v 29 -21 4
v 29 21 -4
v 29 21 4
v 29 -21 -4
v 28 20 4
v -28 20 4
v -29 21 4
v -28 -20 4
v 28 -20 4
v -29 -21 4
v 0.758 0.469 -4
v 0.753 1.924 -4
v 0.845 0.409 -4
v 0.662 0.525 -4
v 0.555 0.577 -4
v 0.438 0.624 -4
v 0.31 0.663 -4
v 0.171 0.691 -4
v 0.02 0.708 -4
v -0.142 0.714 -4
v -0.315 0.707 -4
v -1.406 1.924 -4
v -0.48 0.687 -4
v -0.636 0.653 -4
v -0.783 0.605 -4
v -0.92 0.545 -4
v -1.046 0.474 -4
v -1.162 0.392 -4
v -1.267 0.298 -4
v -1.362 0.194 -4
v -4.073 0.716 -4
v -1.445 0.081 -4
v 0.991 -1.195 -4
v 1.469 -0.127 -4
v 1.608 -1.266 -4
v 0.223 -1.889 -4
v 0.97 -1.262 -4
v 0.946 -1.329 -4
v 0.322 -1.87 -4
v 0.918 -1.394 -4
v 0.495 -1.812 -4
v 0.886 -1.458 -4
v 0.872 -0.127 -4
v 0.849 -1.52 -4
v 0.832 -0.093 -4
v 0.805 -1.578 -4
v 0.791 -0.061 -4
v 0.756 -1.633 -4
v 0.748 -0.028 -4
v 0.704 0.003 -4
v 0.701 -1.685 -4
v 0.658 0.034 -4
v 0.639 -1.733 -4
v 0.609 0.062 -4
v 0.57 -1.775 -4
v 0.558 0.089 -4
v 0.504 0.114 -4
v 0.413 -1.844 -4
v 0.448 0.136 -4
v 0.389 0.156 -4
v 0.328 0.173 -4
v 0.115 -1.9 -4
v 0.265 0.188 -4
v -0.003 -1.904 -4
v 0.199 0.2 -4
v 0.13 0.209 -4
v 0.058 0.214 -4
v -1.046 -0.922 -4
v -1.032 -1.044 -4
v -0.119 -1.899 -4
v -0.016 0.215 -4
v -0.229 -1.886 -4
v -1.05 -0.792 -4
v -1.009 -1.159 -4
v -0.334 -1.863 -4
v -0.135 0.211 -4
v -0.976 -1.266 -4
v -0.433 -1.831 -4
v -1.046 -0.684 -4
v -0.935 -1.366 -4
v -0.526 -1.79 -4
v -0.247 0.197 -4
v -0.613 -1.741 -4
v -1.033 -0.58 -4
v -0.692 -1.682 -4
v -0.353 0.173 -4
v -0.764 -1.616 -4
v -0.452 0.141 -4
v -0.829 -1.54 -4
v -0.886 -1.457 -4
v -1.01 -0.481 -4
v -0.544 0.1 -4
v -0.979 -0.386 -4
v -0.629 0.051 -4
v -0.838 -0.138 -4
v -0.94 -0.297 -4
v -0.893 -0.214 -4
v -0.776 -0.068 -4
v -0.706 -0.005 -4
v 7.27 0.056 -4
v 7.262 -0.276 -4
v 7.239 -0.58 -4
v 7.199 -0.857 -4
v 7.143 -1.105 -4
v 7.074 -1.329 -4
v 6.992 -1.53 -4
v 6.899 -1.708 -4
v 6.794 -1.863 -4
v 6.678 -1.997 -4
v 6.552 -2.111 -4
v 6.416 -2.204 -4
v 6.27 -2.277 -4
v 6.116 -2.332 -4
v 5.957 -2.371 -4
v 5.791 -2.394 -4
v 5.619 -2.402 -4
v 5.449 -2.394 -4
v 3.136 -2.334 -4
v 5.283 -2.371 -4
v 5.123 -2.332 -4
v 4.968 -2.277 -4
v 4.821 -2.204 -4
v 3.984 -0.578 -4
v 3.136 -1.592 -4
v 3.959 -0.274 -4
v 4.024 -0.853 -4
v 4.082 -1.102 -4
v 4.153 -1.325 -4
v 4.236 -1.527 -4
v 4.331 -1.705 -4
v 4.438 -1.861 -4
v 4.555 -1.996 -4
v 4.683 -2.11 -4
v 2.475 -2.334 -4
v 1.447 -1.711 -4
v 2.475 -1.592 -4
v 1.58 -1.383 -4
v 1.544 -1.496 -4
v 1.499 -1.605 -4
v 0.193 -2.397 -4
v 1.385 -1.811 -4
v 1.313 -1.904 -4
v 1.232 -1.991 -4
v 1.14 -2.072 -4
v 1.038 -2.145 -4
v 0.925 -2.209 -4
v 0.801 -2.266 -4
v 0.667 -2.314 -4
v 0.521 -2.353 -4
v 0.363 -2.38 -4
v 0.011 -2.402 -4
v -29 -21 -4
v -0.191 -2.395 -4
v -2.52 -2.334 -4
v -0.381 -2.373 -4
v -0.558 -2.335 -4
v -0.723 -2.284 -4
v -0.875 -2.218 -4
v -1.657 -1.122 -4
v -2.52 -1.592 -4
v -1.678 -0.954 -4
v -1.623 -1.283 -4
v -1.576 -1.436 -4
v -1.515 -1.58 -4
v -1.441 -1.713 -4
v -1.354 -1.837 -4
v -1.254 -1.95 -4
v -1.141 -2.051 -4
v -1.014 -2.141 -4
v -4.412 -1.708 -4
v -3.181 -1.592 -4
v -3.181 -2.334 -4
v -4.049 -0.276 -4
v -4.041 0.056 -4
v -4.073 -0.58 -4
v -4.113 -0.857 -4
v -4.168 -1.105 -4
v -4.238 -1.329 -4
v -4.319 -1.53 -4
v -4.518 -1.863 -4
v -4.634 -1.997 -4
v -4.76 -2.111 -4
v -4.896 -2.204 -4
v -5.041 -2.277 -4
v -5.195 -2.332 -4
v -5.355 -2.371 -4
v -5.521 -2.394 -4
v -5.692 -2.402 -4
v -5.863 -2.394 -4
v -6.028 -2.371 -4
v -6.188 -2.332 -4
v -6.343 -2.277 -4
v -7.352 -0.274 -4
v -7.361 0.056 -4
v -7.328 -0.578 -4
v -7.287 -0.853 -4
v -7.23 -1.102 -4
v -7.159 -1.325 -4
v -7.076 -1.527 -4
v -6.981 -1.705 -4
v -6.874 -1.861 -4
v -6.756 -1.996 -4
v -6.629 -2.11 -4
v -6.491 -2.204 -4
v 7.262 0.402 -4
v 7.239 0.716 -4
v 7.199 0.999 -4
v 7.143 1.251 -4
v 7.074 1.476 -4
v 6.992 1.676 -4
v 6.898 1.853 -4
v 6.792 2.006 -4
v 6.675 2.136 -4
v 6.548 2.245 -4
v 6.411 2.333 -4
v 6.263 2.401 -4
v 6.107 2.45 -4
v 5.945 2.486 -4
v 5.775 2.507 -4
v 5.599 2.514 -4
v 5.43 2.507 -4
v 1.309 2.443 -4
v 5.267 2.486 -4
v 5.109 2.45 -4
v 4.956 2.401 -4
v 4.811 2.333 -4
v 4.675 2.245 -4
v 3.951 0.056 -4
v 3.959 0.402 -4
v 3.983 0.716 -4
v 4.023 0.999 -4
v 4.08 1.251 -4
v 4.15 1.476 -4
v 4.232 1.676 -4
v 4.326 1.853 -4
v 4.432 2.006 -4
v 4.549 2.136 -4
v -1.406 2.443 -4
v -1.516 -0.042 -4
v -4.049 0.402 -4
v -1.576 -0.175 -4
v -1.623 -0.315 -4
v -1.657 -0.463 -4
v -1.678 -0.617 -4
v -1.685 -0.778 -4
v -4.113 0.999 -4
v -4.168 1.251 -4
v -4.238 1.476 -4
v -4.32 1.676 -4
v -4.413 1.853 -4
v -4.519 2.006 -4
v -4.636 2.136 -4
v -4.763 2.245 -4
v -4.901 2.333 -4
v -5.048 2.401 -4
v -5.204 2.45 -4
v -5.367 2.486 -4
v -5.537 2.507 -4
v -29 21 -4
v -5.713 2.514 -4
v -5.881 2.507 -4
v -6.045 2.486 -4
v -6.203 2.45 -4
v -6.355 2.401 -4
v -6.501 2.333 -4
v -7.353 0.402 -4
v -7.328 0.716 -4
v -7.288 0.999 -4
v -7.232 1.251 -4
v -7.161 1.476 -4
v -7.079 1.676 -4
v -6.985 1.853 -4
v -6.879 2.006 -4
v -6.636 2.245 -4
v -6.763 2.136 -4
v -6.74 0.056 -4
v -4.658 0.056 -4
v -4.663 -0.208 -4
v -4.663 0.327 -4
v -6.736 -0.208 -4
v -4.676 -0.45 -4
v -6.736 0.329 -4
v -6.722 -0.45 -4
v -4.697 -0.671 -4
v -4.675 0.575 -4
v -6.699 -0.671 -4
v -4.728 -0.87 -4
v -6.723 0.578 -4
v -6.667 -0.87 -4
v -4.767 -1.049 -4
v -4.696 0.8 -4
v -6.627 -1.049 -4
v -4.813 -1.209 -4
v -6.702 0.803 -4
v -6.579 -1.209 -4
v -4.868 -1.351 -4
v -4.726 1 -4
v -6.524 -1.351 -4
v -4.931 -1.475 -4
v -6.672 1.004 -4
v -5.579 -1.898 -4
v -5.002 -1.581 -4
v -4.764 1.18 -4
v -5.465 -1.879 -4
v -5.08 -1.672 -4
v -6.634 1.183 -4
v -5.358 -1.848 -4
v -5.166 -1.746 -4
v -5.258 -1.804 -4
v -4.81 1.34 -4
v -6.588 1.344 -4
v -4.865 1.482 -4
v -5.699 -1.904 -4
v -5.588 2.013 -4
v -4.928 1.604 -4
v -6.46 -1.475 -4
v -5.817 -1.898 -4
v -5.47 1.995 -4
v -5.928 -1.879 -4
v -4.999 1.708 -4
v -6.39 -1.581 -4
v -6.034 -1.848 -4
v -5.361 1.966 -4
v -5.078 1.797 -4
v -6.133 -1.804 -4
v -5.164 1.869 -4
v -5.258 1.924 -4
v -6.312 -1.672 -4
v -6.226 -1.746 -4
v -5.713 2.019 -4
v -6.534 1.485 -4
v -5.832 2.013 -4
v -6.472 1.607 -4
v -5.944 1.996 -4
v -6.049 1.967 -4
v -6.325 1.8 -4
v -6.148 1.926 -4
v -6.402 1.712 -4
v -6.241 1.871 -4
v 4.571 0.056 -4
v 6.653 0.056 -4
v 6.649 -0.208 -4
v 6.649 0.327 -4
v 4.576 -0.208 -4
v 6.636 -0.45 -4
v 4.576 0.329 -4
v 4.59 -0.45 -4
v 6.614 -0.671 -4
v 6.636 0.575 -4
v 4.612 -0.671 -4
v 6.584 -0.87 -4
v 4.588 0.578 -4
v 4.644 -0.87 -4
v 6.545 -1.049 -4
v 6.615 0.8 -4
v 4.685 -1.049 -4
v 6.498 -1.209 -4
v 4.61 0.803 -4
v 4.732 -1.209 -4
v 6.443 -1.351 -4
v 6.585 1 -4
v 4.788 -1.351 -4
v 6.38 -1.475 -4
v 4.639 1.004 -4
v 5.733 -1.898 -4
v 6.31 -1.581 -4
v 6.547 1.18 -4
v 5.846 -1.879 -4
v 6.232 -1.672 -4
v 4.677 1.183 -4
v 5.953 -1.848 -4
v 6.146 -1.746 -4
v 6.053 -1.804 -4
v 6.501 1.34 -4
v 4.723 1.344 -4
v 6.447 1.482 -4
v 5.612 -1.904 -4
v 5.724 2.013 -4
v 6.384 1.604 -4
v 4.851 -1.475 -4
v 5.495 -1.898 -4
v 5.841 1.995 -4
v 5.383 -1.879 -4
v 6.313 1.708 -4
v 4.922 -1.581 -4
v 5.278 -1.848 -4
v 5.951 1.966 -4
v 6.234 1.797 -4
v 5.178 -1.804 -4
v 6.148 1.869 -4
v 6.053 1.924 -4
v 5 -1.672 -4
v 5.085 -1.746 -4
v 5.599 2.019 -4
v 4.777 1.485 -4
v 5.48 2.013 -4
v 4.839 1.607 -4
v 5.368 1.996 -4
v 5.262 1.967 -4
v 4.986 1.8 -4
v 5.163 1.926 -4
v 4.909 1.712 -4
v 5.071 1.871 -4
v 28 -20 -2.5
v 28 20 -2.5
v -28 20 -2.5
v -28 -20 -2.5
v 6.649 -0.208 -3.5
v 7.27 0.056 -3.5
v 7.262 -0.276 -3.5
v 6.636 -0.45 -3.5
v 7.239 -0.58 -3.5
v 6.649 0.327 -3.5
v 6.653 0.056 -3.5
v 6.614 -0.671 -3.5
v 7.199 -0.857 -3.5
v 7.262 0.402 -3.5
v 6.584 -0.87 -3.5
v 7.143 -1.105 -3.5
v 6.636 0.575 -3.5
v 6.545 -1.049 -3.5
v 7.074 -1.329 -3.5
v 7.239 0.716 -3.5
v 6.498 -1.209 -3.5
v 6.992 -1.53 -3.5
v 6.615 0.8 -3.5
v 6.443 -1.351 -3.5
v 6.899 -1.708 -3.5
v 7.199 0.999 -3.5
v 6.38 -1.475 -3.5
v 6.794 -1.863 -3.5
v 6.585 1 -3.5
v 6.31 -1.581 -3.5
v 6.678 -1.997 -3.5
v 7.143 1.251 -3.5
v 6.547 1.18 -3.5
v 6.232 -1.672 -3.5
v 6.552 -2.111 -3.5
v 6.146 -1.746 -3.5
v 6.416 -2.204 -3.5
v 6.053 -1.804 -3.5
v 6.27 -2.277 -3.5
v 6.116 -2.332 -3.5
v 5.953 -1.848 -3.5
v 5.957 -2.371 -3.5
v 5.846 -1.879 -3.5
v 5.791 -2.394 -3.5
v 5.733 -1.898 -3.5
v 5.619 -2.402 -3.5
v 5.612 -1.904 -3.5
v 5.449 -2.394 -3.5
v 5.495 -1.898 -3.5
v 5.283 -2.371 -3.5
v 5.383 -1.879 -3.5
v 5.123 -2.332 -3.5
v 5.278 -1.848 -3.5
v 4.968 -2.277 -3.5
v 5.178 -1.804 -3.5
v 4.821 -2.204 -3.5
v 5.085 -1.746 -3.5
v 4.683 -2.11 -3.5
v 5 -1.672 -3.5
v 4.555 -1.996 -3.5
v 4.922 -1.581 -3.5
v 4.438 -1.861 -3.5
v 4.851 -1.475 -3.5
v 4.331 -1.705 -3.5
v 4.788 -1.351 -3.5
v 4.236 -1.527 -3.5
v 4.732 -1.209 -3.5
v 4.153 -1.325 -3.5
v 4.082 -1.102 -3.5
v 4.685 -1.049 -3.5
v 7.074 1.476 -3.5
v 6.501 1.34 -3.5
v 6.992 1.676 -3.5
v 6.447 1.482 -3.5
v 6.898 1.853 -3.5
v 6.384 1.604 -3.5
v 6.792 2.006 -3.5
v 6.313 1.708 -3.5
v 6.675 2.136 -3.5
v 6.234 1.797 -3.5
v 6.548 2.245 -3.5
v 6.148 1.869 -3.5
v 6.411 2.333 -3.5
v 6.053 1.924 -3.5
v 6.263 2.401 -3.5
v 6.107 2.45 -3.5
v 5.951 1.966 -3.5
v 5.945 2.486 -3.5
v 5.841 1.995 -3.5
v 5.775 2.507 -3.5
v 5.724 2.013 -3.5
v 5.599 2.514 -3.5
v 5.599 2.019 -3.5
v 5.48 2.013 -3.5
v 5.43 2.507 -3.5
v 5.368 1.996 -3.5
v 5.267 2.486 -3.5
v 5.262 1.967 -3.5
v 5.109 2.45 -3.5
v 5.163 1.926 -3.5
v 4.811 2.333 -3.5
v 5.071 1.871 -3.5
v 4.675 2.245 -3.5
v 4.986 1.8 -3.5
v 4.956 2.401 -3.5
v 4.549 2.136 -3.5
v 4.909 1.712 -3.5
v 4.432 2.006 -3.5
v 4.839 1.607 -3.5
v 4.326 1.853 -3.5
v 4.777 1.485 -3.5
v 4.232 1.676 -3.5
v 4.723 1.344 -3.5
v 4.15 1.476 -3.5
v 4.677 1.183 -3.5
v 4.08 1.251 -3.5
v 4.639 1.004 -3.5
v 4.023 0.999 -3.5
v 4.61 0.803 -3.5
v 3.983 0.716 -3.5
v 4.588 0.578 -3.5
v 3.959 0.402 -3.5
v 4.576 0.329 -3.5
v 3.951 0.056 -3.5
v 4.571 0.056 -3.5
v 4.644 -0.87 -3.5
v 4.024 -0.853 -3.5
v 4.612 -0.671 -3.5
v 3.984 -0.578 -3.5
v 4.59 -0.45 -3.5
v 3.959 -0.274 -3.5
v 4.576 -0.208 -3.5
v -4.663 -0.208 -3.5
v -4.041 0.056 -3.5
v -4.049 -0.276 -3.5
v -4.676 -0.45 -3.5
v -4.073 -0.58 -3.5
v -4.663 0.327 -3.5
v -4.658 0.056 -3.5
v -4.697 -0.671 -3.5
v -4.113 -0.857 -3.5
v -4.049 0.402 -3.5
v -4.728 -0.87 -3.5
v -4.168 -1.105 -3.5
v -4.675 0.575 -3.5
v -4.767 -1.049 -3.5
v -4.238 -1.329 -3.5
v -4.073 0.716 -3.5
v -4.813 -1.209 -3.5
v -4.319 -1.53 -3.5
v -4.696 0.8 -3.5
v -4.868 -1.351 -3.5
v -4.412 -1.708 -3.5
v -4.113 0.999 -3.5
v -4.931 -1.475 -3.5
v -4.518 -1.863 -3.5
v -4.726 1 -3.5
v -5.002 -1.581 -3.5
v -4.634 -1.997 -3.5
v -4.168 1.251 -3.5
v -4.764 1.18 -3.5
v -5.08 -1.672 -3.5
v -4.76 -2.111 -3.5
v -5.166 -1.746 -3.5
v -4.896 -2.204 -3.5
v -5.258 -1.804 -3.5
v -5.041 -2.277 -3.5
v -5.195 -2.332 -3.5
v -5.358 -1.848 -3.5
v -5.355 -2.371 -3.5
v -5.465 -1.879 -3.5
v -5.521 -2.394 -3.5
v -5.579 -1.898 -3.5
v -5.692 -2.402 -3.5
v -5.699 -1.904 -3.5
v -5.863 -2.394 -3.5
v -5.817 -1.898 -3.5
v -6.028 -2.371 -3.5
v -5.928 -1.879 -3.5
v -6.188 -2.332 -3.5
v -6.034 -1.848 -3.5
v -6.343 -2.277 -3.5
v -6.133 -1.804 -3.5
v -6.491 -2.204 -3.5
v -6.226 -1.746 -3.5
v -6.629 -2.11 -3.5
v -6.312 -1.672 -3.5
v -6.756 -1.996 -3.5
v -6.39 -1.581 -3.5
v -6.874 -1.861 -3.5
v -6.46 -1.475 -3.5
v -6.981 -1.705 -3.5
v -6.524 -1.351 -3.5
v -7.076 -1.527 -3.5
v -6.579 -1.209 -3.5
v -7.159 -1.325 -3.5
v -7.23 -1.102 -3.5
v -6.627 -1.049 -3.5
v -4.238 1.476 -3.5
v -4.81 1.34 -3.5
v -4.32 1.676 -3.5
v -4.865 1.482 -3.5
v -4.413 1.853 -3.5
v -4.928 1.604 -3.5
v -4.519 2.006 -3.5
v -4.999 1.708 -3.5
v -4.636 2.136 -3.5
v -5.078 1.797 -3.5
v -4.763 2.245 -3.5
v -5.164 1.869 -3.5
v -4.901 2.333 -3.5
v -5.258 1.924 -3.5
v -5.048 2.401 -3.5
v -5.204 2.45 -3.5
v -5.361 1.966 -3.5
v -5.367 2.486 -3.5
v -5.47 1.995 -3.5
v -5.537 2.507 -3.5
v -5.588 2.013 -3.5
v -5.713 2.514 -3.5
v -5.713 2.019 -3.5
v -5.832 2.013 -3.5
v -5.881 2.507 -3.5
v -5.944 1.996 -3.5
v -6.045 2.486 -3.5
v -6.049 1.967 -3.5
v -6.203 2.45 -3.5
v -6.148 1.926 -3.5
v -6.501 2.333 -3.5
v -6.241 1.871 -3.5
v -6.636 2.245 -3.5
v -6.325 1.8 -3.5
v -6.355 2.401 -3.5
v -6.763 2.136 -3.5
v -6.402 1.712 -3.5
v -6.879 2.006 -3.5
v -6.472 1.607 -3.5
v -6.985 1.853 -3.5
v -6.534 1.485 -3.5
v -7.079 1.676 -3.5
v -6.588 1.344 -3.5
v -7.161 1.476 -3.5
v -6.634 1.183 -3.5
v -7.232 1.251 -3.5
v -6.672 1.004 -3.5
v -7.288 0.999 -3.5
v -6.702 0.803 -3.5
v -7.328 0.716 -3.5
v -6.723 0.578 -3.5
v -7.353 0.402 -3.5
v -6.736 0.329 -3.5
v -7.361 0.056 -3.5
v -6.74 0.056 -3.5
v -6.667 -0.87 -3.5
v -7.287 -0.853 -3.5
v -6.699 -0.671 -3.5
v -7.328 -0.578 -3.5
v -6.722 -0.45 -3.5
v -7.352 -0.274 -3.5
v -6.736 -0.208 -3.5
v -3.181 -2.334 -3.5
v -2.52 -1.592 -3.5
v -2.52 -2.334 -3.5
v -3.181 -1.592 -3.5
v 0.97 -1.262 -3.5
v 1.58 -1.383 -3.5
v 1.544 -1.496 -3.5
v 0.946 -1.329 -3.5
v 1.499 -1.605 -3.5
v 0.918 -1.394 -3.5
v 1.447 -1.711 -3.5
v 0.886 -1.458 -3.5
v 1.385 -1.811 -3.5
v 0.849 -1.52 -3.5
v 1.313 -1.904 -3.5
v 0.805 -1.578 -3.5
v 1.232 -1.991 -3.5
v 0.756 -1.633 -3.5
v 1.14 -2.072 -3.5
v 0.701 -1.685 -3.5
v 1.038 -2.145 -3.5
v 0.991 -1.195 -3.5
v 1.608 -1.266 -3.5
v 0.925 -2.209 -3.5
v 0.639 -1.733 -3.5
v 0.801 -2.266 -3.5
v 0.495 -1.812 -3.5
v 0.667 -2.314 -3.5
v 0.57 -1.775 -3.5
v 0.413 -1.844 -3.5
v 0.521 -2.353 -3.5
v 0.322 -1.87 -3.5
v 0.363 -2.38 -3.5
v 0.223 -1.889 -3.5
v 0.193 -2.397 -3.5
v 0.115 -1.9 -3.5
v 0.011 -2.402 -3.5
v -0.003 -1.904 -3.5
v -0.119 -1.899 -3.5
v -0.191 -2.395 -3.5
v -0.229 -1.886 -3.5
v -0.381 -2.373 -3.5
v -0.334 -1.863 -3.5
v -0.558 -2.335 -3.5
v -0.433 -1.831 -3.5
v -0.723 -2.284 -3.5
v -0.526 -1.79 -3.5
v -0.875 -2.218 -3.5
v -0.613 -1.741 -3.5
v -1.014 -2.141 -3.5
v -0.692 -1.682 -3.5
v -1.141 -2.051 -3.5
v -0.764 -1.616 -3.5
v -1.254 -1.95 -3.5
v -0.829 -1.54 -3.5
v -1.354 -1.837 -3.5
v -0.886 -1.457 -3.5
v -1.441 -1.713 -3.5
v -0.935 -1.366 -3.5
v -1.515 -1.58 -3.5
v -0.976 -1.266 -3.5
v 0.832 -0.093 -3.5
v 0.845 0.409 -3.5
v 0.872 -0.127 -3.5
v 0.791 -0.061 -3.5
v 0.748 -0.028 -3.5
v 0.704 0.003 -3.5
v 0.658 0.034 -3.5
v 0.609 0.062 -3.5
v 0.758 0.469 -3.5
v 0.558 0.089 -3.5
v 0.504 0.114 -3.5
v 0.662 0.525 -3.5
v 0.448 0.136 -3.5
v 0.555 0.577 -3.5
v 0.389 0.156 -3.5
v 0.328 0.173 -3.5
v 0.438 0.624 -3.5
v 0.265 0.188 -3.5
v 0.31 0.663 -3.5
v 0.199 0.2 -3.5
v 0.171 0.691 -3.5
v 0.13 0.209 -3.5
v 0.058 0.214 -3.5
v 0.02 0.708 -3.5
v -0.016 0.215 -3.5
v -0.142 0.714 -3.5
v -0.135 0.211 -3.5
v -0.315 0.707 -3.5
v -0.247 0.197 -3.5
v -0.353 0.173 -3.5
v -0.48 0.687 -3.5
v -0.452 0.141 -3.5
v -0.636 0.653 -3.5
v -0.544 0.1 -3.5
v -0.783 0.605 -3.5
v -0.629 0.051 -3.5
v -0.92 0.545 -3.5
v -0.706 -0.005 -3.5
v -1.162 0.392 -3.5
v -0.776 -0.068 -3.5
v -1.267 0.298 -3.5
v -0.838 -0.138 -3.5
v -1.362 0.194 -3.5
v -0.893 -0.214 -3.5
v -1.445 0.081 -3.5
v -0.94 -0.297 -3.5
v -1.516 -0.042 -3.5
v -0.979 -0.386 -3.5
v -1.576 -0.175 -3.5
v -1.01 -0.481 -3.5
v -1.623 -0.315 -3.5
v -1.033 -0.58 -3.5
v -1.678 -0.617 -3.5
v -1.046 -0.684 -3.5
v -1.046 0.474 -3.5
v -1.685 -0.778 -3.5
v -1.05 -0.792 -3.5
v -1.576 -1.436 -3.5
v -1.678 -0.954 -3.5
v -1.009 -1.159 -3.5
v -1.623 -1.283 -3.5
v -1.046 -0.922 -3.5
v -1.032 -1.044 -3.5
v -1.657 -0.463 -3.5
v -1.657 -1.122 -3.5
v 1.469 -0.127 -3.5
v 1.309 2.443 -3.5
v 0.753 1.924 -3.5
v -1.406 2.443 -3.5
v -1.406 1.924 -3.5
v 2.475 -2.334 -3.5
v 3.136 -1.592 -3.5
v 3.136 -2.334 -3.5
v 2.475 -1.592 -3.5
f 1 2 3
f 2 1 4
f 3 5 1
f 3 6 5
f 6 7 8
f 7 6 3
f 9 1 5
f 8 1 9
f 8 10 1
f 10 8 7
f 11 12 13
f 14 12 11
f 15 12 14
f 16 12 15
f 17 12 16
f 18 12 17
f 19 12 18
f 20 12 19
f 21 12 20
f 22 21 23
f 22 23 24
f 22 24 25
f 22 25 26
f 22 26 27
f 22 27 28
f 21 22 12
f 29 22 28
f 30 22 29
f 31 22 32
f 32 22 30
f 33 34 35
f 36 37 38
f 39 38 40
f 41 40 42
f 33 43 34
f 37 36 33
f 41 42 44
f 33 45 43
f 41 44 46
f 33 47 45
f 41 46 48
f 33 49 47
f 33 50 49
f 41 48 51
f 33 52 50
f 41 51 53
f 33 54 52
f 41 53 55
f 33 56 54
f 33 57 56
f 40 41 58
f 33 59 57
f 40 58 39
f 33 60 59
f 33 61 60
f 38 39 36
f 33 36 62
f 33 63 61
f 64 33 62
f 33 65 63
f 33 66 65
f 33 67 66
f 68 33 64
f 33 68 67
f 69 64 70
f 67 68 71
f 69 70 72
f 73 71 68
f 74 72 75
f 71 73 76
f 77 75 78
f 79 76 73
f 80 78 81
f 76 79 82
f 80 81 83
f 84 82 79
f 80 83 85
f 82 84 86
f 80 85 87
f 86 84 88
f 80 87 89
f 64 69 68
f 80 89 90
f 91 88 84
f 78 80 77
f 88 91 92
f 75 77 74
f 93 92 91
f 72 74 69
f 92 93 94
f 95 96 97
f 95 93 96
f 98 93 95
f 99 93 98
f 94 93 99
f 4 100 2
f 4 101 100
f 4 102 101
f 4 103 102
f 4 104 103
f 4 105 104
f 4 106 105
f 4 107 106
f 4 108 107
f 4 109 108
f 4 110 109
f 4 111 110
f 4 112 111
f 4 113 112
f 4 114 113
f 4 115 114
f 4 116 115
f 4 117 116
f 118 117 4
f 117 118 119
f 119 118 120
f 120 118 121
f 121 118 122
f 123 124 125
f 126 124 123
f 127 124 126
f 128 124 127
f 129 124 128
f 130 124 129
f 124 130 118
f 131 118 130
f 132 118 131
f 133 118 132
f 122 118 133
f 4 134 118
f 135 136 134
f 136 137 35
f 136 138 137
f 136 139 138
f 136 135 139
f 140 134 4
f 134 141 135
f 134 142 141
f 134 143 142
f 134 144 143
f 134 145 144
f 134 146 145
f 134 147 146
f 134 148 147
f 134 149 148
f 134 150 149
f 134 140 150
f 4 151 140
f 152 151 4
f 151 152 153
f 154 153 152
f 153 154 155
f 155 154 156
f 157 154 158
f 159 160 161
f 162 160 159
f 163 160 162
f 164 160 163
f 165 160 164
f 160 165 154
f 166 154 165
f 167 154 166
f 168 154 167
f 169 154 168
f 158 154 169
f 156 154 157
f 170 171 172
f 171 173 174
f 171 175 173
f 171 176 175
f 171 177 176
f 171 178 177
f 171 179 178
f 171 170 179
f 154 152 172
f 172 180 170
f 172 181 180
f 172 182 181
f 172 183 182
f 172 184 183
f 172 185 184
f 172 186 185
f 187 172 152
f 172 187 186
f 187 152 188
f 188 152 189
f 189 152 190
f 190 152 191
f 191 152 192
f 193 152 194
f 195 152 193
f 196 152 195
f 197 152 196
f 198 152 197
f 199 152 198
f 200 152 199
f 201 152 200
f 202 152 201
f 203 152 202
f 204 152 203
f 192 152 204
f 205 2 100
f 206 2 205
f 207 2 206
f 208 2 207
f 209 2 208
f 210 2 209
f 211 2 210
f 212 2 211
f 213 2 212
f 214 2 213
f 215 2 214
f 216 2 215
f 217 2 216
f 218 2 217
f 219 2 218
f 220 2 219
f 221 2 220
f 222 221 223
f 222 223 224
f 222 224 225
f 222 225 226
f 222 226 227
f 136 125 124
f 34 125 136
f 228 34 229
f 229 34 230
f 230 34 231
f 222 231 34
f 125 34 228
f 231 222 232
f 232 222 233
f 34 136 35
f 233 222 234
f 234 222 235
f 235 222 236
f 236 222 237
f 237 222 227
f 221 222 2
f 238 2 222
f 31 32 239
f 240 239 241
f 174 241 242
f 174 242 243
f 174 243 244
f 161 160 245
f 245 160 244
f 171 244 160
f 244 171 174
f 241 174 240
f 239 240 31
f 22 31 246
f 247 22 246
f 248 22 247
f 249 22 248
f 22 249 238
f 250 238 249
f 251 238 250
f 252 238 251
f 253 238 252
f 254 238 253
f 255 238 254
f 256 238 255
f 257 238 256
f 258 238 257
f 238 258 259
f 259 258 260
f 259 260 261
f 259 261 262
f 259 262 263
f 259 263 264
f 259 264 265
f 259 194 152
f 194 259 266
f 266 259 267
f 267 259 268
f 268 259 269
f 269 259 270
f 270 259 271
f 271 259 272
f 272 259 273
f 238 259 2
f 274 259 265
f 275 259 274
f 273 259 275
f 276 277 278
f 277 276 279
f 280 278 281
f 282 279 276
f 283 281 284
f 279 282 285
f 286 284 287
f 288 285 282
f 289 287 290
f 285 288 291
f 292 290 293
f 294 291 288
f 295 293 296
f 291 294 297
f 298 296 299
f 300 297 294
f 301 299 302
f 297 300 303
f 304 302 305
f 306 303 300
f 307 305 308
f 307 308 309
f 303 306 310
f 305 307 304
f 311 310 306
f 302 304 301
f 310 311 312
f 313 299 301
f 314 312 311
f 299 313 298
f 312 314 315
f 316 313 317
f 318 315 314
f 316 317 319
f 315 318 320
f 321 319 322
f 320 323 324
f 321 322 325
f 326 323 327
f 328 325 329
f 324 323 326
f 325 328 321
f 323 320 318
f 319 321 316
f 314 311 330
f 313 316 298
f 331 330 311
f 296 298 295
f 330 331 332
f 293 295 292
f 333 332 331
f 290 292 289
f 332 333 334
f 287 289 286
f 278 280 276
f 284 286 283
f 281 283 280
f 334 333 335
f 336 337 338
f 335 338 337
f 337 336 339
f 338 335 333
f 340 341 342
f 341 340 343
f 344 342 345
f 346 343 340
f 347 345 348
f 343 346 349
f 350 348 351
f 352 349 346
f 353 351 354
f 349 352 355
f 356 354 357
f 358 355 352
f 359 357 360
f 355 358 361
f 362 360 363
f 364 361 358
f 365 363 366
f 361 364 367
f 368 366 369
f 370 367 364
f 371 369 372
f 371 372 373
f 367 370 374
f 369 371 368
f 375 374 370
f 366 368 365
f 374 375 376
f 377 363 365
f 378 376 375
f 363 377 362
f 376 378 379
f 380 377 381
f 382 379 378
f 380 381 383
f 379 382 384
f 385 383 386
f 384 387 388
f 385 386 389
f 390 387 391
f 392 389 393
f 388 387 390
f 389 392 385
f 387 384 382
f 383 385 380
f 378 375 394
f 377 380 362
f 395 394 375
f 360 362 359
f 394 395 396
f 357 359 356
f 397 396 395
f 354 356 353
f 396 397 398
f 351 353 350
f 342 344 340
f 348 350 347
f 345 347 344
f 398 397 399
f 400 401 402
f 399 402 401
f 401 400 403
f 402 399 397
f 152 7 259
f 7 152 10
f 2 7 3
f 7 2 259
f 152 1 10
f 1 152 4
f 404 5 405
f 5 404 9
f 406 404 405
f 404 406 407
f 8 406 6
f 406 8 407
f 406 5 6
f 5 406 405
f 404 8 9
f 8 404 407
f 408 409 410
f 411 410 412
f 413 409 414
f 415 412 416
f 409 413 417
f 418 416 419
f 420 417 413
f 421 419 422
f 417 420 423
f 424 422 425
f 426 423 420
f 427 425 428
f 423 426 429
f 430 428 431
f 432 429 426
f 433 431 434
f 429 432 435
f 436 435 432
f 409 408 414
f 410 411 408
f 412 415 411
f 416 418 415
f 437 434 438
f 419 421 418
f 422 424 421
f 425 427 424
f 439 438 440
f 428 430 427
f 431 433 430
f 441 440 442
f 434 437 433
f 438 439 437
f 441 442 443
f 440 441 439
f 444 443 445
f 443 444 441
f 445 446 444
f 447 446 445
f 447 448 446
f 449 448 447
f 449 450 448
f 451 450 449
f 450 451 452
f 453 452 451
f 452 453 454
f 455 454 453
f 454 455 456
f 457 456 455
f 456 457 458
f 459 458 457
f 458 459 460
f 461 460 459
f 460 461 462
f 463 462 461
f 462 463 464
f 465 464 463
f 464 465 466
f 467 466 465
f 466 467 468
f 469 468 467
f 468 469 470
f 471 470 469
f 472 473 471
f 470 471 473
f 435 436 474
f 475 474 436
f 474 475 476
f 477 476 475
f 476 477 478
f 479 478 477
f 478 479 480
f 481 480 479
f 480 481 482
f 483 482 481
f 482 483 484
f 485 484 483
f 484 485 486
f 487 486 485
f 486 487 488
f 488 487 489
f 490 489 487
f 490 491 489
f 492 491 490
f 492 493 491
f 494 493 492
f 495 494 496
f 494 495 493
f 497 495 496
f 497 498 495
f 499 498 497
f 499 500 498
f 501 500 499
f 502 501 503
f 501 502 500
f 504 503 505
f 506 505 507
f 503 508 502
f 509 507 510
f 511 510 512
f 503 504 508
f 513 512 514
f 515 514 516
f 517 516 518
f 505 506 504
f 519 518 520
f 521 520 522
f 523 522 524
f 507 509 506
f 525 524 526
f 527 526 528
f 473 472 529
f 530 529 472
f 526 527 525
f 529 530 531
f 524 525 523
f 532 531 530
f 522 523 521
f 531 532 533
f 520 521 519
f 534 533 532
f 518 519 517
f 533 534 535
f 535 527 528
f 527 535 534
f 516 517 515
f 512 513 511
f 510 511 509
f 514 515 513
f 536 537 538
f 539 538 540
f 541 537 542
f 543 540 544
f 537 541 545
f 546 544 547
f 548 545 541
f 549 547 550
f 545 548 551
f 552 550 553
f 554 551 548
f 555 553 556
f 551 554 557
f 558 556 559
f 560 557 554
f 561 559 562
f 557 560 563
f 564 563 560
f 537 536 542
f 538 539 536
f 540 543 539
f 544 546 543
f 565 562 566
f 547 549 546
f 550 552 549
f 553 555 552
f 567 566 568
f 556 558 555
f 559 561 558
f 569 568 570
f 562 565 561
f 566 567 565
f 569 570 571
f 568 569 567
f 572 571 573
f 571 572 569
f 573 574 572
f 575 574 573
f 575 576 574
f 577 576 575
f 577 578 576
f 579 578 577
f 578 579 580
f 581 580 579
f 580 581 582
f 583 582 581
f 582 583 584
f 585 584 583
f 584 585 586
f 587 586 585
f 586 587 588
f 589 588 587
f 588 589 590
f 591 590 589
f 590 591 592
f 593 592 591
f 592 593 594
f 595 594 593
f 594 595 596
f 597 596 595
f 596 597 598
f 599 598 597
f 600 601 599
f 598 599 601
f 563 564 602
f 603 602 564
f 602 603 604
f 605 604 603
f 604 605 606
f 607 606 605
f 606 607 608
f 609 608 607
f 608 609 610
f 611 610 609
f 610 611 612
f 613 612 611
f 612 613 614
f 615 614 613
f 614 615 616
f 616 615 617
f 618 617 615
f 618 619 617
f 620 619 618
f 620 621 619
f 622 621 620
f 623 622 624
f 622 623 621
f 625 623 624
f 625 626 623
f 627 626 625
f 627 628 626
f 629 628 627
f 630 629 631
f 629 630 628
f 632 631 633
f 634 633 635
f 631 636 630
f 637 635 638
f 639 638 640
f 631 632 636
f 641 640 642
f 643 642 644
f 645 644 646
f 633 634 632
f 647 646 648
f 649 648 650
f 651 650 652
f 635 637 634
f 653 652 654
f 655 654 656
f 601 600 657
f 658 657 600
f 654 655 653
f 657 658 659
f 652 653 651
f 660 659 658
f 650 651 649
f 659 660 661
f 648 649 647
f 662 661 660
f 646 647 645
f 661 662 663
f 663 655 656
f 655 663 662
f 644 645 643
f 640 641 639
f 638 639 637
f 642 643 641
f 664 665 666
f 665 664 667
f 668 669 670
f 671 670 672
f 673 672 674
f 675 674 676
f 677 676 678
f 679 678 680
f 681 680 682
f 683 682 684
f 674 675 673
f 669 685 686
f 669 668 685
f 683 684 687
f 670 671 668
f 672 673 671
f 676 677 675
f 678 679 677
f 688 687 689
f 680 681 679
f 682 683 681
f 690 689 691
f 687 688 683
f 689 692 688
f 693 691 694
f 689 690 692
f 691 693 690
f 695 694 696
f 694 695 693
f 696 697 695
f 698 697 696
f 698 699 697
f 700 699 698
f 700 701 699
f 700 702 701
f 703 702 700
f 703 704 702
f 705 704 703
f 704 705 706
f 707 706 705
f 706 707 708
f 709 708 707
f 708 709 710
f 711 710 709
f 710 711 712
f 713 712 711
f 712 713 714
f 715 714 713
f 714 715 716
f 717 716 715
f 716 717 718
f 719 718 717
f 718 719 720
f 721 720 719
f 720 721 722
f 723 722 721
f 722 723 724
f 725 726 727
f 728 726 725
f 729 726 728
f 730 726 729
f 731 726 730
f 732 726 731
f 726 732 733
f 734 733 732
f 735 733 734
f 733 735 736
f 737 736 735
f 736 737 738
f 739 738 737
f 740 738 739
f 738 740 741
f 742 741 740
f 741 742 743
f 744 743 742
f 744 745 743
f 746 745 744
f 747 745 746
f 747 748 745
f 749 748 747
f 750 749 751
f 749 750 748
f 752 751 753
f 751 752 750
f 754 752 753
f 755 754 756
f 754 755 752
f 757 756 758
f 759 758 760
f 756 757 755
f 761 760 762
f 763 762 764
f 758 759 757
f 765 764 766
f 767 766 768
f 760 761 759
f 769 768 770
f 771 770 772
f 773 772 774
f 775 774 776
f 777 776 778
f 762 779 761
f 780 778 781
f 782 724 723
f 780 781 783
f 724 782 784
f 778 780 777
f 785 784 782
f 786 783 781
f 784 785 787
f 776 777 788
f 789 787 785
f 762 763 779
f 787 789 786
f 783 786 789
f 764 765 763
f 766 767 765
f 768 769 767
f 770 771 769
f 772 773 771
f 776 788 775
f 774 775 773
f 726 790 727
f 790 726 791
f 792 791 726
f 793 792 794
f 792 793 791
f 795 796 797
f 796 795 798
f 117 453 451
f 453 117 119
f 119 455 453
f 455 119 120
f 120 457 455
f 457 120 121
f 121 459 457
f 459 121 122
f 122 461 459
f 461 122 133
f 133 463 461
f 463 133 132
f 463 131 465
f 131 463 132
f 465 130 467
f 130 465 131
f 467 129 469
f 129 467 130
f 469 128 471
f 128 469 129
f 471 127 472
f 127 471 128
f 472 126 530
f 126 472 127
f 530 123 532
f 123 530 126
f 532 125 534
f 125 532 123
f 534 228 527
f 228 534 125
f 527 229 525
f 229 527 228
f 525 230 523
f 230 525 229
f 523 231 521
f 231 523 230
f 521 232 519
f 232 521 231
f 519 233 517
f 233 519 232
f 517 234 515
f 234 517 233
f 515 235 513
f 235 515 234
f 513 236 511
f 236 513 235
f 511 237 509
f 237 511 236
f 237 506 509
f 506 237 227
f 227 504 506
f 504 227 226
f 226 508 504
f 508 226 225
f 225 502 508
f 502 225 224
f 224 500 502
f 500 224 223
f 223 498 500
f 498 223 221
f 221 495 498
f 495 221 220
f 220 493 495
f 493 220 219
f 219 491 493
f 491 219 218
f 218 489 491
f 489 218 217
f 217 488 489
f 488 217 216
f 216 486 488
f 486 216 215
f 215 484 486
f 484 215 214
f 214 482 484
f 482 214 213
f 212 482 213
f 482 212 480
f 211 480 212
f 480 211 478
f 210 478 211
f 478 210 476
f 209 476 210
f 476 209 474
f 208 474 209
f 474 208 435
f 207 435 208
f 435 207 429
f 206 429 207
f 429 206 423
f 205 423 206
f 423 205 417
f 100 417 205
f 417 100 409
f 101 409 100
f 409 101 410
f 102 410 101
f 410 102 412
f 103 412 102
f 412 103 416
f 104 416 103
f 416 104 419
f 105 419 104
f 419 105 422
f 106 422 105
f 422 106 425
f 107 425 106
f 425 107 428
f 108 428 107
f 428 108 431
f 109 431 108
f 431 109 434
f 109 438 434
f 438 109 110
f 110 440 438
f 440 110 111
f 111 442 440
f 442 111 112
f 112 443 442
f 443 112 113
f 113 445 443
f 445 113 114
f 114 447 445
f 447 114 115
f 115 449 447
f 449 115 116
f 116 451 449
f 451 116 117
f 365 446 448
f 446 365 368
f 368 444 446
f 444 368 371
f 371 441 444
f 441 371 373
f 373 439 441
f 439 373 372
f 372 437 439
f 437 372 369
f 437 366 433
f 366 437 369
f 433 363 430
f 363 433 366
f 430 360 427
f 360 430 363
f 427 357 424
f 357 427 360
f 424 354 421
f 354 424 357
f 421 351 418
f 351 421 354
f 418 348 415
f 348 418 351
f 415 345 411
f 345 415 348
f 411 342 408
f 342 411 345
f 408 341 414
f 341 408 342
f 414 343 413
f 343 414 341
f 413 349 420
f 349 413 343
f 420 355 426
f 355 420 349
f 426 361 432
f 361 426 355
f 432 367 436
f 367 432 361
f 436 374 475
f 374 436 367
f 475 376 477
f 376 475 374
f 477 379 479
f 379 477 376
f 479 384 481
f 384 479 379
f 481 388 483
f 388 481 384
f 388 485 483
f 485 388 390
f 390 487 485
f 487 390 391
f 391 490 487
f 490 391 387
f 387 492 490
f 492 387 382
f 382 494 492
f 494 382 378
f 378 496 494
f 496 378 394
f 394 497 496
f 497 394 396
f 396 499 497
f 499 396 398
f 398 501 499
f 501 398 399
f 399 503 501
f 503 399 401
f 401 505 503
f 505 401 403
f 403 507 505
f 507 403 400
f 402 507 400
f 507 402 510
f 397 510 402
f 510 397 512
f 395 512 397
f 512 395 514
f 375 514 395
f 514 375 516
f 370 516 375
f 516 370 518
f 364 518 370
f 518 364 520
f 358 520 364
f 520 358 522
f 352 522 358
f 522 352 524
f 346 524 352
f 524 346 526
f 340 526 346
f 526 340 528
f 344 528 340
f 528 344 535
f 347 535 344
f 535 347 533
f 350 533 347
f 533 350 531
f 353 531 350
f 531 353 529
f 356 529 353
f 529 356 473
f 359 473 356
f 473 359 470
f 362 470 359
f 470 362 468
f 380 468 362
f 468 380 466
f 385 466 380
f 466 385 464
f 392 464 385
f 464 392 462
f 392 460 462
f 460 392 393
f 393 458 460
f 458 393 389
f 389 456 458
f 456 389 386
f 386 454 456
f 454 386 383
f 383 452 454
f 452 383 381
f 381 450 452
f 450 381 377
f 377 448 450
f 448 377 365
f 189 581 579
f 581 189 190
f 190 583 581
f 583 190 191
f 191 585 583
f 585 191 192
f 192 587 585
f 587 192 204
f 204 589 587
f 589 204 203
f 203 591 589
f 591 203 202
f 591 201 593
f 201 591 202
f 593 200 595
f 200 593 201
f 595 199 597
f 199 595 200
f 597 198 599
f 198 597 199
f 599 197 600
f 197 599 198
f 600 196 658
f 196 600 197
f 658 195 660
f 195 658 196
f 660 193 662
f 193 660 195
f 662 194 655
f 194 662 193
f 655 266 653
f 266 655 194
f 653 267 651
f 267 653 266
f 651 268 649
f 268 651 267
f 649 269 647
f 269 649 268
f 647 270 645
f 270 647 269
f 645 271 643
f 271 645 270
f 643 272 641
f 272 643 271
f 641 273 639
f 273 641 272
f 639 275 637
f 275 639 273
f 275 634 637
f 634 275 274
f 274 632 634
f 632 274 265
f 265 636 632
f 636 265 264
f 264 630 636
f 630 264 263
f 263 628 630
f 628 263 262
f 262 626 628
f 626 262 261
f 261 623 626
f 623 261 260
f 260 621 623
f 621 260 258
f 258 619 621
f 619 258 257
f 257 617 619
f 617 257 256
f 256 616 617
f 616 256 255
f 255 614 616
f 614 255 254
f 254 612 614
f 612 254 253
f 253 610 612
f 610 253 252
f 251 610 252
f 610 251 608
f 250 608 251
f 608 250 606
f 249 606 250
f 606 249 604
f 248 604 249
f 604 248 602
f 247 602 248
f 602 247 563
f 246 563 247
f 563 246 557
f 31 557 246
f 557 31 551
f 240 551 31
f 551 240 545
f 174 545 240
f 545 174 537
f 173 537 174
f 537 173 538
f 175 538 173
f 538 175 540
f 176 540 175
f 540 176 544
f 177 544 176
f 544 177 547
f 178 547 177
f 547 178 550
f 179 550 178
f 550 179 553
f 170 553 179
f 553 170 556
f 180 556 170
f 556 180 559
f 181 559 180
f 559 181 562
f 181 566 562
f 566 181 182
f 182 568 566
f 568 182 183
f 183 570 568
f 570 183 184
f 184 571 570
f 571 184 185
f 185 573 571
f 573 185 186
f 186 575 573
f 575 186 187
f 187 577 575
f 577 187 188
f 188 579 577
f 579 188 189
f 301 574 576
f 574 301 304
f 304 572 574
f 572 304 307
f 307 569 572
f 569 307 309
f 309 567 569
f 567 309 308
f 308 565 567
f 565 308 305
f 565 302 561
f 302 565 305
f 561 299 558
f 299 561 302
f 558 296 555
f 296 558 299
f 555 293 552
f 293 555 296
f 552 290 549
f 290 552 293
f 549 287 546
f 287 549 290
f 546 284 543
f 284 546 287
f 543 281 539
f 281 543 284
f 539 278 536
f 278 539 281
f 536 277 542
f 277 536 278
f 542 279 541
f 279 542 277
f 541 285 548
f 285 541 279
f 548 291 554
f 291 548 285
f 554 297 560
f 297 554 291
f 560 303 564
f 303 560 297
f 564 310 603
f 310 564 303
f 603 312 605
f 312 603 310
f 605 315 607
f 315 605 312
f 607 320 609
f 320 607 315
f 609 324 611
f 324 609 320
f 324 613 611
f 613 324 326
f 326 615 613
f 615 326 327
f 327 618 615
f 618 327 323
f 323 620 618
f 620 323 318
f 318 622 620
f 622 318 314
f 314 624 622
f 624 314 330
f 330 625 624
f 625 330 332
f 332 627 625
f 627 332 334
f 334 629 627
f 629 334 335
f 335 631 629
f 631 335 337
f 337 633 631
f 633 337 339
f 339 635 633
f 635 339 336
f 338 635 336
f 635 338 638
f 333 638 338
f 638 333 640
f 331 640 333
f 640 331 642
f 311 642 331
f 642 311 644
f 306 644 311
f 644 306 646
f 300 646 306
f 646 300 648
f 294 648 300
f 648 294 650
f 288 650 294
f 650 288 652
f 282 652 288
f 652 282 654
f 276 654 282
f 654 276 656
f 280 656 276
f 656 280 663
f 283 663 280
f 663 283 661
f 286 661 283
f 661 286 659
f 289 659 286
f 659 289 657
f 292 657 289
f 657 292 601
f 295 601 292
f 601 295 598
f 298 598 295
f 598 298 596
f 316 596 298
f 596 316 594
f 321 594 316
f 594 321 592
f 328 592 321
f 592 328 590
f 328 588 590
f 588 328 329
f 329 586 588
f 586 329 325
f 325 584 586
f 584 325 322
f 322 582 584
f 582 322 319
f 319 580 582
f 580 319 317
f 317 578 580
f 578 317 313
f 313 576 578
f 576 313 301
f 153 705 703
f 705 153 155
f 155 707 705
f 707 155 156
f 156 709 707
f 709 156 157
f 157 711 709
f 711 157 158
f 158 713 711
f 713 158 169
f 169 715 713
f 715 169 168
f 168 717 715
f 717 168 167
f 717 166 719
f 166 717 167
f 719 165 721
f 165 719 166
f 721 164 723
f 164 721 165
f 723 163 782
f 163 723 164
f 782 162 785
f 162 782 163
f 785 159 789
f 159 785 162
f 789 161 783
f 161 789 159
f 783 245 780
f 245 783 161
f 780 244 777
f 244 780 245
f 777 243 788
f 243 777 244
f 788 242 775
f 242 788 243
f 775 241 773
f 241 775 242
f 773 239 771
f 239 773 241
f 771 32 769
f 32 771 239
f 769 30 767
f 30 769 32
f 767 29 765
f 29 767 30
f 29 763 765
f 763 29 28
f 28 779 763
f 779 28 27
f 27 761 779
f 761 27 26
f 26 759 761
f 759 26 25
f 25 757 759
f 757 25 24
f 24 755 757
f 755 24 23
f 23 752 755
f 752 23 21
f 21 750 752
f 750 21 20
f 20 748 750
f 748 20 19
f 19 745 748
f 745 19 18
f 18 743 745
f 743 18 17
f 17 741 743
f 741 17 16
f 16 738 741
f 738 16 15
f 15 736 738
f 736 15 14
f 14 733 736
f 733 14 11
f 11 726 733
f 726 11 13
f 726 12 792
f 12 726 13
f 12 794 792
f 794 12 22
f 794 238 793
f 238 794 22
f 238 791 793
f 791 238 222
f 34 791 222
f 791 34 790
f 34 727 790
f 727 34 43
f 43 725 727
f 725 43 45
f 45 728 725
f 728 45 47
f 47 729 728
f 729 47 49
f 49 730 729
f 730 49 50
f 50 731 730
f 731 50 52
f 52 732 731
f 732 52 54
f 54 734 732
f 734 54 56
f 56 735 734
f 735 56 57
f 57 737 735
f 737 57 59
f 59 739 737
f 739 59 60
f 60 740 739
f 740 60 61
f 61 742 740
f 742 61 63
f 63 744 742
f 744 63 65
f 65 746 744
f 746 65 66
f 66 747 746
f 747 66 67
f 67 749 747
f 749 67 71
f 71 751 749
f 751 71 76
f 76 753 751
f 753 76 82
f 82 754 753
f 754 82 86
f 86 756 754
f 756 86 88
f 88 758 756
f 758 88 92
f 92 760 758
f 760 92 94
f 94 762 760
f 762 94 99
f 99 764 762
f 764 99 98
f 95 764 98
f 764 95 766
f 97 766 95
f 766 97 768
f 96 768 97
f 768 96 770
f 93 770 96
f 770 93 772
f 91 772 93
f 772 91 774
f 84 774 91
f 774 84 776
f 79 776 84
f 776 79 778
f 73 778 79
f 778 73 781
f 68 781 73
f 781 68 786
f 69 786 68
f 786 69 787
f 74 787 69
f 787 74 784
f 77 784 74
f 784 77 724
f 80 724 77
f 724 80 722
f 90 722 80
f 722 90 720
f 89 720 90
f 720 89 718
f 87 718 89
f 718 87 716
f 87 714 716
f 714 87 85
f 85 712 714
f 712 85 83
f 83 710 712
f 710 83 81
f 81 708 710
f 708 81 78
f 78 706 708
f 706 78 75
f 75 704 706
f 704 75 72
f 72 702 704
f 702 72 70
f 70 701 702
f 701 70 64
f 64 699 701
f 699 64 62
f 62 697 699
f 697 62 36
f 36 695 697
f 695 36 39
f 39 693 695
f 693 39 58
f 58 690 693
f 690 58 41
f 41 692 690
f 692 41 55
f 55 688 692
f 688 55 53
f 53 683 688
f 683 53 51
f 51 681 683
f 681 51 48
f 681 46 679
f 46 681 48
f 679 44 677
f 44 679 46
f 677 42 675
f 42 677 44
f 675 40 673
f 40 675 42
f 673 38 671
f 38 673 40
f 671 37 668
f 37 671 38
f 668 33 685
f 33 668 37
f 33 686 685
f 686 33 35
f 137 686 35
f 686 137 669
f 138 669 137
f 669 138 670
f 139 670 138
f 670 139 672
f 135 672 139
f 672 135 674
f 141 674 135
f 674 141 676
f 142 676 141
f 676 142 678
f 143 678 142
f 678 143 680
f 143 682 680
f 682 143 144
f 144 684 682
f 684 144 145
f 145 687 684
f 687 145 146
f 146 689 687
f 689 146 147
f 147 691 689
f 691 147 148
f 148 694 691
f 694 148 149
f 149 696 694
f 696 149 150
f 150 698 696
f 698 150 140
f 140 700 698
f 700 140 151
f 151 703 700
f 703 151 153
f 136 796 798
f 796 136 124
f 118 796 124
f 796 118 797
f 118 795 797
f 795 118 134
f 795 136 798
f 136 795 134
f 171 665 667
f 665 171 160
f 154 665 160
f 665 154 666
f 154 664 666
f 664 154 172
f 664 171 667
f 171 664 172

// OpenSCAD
version = "0.5.0";

function toUnits(inches=0, sixteenths=0) = (inches * 16) + sixteenths;

voidWidth = toUnits(3,8);
voidLength = toUnits(2,8);
voidDepth = 7;

shellWidth = voidWidth + 2;
shellLength = voidLength + 2;
shellDepth = voidDepth + 1;

difference() {
    // shell
    cube ([shellWidth, shellLength,shellDepth ], true);
    // void
    translate ([0,0,1]) cube ([voidWidth, voidLength,voidDepth], true);
    // version
    translate ([0, 0, - (shellDepth / 2) + 0.5])
    rotate ([0,180,0])
        linear_extrude (1) {
            scale (.5, .5, .5)
            text(version, halign = "center", valign = "center");
        } ;
}
